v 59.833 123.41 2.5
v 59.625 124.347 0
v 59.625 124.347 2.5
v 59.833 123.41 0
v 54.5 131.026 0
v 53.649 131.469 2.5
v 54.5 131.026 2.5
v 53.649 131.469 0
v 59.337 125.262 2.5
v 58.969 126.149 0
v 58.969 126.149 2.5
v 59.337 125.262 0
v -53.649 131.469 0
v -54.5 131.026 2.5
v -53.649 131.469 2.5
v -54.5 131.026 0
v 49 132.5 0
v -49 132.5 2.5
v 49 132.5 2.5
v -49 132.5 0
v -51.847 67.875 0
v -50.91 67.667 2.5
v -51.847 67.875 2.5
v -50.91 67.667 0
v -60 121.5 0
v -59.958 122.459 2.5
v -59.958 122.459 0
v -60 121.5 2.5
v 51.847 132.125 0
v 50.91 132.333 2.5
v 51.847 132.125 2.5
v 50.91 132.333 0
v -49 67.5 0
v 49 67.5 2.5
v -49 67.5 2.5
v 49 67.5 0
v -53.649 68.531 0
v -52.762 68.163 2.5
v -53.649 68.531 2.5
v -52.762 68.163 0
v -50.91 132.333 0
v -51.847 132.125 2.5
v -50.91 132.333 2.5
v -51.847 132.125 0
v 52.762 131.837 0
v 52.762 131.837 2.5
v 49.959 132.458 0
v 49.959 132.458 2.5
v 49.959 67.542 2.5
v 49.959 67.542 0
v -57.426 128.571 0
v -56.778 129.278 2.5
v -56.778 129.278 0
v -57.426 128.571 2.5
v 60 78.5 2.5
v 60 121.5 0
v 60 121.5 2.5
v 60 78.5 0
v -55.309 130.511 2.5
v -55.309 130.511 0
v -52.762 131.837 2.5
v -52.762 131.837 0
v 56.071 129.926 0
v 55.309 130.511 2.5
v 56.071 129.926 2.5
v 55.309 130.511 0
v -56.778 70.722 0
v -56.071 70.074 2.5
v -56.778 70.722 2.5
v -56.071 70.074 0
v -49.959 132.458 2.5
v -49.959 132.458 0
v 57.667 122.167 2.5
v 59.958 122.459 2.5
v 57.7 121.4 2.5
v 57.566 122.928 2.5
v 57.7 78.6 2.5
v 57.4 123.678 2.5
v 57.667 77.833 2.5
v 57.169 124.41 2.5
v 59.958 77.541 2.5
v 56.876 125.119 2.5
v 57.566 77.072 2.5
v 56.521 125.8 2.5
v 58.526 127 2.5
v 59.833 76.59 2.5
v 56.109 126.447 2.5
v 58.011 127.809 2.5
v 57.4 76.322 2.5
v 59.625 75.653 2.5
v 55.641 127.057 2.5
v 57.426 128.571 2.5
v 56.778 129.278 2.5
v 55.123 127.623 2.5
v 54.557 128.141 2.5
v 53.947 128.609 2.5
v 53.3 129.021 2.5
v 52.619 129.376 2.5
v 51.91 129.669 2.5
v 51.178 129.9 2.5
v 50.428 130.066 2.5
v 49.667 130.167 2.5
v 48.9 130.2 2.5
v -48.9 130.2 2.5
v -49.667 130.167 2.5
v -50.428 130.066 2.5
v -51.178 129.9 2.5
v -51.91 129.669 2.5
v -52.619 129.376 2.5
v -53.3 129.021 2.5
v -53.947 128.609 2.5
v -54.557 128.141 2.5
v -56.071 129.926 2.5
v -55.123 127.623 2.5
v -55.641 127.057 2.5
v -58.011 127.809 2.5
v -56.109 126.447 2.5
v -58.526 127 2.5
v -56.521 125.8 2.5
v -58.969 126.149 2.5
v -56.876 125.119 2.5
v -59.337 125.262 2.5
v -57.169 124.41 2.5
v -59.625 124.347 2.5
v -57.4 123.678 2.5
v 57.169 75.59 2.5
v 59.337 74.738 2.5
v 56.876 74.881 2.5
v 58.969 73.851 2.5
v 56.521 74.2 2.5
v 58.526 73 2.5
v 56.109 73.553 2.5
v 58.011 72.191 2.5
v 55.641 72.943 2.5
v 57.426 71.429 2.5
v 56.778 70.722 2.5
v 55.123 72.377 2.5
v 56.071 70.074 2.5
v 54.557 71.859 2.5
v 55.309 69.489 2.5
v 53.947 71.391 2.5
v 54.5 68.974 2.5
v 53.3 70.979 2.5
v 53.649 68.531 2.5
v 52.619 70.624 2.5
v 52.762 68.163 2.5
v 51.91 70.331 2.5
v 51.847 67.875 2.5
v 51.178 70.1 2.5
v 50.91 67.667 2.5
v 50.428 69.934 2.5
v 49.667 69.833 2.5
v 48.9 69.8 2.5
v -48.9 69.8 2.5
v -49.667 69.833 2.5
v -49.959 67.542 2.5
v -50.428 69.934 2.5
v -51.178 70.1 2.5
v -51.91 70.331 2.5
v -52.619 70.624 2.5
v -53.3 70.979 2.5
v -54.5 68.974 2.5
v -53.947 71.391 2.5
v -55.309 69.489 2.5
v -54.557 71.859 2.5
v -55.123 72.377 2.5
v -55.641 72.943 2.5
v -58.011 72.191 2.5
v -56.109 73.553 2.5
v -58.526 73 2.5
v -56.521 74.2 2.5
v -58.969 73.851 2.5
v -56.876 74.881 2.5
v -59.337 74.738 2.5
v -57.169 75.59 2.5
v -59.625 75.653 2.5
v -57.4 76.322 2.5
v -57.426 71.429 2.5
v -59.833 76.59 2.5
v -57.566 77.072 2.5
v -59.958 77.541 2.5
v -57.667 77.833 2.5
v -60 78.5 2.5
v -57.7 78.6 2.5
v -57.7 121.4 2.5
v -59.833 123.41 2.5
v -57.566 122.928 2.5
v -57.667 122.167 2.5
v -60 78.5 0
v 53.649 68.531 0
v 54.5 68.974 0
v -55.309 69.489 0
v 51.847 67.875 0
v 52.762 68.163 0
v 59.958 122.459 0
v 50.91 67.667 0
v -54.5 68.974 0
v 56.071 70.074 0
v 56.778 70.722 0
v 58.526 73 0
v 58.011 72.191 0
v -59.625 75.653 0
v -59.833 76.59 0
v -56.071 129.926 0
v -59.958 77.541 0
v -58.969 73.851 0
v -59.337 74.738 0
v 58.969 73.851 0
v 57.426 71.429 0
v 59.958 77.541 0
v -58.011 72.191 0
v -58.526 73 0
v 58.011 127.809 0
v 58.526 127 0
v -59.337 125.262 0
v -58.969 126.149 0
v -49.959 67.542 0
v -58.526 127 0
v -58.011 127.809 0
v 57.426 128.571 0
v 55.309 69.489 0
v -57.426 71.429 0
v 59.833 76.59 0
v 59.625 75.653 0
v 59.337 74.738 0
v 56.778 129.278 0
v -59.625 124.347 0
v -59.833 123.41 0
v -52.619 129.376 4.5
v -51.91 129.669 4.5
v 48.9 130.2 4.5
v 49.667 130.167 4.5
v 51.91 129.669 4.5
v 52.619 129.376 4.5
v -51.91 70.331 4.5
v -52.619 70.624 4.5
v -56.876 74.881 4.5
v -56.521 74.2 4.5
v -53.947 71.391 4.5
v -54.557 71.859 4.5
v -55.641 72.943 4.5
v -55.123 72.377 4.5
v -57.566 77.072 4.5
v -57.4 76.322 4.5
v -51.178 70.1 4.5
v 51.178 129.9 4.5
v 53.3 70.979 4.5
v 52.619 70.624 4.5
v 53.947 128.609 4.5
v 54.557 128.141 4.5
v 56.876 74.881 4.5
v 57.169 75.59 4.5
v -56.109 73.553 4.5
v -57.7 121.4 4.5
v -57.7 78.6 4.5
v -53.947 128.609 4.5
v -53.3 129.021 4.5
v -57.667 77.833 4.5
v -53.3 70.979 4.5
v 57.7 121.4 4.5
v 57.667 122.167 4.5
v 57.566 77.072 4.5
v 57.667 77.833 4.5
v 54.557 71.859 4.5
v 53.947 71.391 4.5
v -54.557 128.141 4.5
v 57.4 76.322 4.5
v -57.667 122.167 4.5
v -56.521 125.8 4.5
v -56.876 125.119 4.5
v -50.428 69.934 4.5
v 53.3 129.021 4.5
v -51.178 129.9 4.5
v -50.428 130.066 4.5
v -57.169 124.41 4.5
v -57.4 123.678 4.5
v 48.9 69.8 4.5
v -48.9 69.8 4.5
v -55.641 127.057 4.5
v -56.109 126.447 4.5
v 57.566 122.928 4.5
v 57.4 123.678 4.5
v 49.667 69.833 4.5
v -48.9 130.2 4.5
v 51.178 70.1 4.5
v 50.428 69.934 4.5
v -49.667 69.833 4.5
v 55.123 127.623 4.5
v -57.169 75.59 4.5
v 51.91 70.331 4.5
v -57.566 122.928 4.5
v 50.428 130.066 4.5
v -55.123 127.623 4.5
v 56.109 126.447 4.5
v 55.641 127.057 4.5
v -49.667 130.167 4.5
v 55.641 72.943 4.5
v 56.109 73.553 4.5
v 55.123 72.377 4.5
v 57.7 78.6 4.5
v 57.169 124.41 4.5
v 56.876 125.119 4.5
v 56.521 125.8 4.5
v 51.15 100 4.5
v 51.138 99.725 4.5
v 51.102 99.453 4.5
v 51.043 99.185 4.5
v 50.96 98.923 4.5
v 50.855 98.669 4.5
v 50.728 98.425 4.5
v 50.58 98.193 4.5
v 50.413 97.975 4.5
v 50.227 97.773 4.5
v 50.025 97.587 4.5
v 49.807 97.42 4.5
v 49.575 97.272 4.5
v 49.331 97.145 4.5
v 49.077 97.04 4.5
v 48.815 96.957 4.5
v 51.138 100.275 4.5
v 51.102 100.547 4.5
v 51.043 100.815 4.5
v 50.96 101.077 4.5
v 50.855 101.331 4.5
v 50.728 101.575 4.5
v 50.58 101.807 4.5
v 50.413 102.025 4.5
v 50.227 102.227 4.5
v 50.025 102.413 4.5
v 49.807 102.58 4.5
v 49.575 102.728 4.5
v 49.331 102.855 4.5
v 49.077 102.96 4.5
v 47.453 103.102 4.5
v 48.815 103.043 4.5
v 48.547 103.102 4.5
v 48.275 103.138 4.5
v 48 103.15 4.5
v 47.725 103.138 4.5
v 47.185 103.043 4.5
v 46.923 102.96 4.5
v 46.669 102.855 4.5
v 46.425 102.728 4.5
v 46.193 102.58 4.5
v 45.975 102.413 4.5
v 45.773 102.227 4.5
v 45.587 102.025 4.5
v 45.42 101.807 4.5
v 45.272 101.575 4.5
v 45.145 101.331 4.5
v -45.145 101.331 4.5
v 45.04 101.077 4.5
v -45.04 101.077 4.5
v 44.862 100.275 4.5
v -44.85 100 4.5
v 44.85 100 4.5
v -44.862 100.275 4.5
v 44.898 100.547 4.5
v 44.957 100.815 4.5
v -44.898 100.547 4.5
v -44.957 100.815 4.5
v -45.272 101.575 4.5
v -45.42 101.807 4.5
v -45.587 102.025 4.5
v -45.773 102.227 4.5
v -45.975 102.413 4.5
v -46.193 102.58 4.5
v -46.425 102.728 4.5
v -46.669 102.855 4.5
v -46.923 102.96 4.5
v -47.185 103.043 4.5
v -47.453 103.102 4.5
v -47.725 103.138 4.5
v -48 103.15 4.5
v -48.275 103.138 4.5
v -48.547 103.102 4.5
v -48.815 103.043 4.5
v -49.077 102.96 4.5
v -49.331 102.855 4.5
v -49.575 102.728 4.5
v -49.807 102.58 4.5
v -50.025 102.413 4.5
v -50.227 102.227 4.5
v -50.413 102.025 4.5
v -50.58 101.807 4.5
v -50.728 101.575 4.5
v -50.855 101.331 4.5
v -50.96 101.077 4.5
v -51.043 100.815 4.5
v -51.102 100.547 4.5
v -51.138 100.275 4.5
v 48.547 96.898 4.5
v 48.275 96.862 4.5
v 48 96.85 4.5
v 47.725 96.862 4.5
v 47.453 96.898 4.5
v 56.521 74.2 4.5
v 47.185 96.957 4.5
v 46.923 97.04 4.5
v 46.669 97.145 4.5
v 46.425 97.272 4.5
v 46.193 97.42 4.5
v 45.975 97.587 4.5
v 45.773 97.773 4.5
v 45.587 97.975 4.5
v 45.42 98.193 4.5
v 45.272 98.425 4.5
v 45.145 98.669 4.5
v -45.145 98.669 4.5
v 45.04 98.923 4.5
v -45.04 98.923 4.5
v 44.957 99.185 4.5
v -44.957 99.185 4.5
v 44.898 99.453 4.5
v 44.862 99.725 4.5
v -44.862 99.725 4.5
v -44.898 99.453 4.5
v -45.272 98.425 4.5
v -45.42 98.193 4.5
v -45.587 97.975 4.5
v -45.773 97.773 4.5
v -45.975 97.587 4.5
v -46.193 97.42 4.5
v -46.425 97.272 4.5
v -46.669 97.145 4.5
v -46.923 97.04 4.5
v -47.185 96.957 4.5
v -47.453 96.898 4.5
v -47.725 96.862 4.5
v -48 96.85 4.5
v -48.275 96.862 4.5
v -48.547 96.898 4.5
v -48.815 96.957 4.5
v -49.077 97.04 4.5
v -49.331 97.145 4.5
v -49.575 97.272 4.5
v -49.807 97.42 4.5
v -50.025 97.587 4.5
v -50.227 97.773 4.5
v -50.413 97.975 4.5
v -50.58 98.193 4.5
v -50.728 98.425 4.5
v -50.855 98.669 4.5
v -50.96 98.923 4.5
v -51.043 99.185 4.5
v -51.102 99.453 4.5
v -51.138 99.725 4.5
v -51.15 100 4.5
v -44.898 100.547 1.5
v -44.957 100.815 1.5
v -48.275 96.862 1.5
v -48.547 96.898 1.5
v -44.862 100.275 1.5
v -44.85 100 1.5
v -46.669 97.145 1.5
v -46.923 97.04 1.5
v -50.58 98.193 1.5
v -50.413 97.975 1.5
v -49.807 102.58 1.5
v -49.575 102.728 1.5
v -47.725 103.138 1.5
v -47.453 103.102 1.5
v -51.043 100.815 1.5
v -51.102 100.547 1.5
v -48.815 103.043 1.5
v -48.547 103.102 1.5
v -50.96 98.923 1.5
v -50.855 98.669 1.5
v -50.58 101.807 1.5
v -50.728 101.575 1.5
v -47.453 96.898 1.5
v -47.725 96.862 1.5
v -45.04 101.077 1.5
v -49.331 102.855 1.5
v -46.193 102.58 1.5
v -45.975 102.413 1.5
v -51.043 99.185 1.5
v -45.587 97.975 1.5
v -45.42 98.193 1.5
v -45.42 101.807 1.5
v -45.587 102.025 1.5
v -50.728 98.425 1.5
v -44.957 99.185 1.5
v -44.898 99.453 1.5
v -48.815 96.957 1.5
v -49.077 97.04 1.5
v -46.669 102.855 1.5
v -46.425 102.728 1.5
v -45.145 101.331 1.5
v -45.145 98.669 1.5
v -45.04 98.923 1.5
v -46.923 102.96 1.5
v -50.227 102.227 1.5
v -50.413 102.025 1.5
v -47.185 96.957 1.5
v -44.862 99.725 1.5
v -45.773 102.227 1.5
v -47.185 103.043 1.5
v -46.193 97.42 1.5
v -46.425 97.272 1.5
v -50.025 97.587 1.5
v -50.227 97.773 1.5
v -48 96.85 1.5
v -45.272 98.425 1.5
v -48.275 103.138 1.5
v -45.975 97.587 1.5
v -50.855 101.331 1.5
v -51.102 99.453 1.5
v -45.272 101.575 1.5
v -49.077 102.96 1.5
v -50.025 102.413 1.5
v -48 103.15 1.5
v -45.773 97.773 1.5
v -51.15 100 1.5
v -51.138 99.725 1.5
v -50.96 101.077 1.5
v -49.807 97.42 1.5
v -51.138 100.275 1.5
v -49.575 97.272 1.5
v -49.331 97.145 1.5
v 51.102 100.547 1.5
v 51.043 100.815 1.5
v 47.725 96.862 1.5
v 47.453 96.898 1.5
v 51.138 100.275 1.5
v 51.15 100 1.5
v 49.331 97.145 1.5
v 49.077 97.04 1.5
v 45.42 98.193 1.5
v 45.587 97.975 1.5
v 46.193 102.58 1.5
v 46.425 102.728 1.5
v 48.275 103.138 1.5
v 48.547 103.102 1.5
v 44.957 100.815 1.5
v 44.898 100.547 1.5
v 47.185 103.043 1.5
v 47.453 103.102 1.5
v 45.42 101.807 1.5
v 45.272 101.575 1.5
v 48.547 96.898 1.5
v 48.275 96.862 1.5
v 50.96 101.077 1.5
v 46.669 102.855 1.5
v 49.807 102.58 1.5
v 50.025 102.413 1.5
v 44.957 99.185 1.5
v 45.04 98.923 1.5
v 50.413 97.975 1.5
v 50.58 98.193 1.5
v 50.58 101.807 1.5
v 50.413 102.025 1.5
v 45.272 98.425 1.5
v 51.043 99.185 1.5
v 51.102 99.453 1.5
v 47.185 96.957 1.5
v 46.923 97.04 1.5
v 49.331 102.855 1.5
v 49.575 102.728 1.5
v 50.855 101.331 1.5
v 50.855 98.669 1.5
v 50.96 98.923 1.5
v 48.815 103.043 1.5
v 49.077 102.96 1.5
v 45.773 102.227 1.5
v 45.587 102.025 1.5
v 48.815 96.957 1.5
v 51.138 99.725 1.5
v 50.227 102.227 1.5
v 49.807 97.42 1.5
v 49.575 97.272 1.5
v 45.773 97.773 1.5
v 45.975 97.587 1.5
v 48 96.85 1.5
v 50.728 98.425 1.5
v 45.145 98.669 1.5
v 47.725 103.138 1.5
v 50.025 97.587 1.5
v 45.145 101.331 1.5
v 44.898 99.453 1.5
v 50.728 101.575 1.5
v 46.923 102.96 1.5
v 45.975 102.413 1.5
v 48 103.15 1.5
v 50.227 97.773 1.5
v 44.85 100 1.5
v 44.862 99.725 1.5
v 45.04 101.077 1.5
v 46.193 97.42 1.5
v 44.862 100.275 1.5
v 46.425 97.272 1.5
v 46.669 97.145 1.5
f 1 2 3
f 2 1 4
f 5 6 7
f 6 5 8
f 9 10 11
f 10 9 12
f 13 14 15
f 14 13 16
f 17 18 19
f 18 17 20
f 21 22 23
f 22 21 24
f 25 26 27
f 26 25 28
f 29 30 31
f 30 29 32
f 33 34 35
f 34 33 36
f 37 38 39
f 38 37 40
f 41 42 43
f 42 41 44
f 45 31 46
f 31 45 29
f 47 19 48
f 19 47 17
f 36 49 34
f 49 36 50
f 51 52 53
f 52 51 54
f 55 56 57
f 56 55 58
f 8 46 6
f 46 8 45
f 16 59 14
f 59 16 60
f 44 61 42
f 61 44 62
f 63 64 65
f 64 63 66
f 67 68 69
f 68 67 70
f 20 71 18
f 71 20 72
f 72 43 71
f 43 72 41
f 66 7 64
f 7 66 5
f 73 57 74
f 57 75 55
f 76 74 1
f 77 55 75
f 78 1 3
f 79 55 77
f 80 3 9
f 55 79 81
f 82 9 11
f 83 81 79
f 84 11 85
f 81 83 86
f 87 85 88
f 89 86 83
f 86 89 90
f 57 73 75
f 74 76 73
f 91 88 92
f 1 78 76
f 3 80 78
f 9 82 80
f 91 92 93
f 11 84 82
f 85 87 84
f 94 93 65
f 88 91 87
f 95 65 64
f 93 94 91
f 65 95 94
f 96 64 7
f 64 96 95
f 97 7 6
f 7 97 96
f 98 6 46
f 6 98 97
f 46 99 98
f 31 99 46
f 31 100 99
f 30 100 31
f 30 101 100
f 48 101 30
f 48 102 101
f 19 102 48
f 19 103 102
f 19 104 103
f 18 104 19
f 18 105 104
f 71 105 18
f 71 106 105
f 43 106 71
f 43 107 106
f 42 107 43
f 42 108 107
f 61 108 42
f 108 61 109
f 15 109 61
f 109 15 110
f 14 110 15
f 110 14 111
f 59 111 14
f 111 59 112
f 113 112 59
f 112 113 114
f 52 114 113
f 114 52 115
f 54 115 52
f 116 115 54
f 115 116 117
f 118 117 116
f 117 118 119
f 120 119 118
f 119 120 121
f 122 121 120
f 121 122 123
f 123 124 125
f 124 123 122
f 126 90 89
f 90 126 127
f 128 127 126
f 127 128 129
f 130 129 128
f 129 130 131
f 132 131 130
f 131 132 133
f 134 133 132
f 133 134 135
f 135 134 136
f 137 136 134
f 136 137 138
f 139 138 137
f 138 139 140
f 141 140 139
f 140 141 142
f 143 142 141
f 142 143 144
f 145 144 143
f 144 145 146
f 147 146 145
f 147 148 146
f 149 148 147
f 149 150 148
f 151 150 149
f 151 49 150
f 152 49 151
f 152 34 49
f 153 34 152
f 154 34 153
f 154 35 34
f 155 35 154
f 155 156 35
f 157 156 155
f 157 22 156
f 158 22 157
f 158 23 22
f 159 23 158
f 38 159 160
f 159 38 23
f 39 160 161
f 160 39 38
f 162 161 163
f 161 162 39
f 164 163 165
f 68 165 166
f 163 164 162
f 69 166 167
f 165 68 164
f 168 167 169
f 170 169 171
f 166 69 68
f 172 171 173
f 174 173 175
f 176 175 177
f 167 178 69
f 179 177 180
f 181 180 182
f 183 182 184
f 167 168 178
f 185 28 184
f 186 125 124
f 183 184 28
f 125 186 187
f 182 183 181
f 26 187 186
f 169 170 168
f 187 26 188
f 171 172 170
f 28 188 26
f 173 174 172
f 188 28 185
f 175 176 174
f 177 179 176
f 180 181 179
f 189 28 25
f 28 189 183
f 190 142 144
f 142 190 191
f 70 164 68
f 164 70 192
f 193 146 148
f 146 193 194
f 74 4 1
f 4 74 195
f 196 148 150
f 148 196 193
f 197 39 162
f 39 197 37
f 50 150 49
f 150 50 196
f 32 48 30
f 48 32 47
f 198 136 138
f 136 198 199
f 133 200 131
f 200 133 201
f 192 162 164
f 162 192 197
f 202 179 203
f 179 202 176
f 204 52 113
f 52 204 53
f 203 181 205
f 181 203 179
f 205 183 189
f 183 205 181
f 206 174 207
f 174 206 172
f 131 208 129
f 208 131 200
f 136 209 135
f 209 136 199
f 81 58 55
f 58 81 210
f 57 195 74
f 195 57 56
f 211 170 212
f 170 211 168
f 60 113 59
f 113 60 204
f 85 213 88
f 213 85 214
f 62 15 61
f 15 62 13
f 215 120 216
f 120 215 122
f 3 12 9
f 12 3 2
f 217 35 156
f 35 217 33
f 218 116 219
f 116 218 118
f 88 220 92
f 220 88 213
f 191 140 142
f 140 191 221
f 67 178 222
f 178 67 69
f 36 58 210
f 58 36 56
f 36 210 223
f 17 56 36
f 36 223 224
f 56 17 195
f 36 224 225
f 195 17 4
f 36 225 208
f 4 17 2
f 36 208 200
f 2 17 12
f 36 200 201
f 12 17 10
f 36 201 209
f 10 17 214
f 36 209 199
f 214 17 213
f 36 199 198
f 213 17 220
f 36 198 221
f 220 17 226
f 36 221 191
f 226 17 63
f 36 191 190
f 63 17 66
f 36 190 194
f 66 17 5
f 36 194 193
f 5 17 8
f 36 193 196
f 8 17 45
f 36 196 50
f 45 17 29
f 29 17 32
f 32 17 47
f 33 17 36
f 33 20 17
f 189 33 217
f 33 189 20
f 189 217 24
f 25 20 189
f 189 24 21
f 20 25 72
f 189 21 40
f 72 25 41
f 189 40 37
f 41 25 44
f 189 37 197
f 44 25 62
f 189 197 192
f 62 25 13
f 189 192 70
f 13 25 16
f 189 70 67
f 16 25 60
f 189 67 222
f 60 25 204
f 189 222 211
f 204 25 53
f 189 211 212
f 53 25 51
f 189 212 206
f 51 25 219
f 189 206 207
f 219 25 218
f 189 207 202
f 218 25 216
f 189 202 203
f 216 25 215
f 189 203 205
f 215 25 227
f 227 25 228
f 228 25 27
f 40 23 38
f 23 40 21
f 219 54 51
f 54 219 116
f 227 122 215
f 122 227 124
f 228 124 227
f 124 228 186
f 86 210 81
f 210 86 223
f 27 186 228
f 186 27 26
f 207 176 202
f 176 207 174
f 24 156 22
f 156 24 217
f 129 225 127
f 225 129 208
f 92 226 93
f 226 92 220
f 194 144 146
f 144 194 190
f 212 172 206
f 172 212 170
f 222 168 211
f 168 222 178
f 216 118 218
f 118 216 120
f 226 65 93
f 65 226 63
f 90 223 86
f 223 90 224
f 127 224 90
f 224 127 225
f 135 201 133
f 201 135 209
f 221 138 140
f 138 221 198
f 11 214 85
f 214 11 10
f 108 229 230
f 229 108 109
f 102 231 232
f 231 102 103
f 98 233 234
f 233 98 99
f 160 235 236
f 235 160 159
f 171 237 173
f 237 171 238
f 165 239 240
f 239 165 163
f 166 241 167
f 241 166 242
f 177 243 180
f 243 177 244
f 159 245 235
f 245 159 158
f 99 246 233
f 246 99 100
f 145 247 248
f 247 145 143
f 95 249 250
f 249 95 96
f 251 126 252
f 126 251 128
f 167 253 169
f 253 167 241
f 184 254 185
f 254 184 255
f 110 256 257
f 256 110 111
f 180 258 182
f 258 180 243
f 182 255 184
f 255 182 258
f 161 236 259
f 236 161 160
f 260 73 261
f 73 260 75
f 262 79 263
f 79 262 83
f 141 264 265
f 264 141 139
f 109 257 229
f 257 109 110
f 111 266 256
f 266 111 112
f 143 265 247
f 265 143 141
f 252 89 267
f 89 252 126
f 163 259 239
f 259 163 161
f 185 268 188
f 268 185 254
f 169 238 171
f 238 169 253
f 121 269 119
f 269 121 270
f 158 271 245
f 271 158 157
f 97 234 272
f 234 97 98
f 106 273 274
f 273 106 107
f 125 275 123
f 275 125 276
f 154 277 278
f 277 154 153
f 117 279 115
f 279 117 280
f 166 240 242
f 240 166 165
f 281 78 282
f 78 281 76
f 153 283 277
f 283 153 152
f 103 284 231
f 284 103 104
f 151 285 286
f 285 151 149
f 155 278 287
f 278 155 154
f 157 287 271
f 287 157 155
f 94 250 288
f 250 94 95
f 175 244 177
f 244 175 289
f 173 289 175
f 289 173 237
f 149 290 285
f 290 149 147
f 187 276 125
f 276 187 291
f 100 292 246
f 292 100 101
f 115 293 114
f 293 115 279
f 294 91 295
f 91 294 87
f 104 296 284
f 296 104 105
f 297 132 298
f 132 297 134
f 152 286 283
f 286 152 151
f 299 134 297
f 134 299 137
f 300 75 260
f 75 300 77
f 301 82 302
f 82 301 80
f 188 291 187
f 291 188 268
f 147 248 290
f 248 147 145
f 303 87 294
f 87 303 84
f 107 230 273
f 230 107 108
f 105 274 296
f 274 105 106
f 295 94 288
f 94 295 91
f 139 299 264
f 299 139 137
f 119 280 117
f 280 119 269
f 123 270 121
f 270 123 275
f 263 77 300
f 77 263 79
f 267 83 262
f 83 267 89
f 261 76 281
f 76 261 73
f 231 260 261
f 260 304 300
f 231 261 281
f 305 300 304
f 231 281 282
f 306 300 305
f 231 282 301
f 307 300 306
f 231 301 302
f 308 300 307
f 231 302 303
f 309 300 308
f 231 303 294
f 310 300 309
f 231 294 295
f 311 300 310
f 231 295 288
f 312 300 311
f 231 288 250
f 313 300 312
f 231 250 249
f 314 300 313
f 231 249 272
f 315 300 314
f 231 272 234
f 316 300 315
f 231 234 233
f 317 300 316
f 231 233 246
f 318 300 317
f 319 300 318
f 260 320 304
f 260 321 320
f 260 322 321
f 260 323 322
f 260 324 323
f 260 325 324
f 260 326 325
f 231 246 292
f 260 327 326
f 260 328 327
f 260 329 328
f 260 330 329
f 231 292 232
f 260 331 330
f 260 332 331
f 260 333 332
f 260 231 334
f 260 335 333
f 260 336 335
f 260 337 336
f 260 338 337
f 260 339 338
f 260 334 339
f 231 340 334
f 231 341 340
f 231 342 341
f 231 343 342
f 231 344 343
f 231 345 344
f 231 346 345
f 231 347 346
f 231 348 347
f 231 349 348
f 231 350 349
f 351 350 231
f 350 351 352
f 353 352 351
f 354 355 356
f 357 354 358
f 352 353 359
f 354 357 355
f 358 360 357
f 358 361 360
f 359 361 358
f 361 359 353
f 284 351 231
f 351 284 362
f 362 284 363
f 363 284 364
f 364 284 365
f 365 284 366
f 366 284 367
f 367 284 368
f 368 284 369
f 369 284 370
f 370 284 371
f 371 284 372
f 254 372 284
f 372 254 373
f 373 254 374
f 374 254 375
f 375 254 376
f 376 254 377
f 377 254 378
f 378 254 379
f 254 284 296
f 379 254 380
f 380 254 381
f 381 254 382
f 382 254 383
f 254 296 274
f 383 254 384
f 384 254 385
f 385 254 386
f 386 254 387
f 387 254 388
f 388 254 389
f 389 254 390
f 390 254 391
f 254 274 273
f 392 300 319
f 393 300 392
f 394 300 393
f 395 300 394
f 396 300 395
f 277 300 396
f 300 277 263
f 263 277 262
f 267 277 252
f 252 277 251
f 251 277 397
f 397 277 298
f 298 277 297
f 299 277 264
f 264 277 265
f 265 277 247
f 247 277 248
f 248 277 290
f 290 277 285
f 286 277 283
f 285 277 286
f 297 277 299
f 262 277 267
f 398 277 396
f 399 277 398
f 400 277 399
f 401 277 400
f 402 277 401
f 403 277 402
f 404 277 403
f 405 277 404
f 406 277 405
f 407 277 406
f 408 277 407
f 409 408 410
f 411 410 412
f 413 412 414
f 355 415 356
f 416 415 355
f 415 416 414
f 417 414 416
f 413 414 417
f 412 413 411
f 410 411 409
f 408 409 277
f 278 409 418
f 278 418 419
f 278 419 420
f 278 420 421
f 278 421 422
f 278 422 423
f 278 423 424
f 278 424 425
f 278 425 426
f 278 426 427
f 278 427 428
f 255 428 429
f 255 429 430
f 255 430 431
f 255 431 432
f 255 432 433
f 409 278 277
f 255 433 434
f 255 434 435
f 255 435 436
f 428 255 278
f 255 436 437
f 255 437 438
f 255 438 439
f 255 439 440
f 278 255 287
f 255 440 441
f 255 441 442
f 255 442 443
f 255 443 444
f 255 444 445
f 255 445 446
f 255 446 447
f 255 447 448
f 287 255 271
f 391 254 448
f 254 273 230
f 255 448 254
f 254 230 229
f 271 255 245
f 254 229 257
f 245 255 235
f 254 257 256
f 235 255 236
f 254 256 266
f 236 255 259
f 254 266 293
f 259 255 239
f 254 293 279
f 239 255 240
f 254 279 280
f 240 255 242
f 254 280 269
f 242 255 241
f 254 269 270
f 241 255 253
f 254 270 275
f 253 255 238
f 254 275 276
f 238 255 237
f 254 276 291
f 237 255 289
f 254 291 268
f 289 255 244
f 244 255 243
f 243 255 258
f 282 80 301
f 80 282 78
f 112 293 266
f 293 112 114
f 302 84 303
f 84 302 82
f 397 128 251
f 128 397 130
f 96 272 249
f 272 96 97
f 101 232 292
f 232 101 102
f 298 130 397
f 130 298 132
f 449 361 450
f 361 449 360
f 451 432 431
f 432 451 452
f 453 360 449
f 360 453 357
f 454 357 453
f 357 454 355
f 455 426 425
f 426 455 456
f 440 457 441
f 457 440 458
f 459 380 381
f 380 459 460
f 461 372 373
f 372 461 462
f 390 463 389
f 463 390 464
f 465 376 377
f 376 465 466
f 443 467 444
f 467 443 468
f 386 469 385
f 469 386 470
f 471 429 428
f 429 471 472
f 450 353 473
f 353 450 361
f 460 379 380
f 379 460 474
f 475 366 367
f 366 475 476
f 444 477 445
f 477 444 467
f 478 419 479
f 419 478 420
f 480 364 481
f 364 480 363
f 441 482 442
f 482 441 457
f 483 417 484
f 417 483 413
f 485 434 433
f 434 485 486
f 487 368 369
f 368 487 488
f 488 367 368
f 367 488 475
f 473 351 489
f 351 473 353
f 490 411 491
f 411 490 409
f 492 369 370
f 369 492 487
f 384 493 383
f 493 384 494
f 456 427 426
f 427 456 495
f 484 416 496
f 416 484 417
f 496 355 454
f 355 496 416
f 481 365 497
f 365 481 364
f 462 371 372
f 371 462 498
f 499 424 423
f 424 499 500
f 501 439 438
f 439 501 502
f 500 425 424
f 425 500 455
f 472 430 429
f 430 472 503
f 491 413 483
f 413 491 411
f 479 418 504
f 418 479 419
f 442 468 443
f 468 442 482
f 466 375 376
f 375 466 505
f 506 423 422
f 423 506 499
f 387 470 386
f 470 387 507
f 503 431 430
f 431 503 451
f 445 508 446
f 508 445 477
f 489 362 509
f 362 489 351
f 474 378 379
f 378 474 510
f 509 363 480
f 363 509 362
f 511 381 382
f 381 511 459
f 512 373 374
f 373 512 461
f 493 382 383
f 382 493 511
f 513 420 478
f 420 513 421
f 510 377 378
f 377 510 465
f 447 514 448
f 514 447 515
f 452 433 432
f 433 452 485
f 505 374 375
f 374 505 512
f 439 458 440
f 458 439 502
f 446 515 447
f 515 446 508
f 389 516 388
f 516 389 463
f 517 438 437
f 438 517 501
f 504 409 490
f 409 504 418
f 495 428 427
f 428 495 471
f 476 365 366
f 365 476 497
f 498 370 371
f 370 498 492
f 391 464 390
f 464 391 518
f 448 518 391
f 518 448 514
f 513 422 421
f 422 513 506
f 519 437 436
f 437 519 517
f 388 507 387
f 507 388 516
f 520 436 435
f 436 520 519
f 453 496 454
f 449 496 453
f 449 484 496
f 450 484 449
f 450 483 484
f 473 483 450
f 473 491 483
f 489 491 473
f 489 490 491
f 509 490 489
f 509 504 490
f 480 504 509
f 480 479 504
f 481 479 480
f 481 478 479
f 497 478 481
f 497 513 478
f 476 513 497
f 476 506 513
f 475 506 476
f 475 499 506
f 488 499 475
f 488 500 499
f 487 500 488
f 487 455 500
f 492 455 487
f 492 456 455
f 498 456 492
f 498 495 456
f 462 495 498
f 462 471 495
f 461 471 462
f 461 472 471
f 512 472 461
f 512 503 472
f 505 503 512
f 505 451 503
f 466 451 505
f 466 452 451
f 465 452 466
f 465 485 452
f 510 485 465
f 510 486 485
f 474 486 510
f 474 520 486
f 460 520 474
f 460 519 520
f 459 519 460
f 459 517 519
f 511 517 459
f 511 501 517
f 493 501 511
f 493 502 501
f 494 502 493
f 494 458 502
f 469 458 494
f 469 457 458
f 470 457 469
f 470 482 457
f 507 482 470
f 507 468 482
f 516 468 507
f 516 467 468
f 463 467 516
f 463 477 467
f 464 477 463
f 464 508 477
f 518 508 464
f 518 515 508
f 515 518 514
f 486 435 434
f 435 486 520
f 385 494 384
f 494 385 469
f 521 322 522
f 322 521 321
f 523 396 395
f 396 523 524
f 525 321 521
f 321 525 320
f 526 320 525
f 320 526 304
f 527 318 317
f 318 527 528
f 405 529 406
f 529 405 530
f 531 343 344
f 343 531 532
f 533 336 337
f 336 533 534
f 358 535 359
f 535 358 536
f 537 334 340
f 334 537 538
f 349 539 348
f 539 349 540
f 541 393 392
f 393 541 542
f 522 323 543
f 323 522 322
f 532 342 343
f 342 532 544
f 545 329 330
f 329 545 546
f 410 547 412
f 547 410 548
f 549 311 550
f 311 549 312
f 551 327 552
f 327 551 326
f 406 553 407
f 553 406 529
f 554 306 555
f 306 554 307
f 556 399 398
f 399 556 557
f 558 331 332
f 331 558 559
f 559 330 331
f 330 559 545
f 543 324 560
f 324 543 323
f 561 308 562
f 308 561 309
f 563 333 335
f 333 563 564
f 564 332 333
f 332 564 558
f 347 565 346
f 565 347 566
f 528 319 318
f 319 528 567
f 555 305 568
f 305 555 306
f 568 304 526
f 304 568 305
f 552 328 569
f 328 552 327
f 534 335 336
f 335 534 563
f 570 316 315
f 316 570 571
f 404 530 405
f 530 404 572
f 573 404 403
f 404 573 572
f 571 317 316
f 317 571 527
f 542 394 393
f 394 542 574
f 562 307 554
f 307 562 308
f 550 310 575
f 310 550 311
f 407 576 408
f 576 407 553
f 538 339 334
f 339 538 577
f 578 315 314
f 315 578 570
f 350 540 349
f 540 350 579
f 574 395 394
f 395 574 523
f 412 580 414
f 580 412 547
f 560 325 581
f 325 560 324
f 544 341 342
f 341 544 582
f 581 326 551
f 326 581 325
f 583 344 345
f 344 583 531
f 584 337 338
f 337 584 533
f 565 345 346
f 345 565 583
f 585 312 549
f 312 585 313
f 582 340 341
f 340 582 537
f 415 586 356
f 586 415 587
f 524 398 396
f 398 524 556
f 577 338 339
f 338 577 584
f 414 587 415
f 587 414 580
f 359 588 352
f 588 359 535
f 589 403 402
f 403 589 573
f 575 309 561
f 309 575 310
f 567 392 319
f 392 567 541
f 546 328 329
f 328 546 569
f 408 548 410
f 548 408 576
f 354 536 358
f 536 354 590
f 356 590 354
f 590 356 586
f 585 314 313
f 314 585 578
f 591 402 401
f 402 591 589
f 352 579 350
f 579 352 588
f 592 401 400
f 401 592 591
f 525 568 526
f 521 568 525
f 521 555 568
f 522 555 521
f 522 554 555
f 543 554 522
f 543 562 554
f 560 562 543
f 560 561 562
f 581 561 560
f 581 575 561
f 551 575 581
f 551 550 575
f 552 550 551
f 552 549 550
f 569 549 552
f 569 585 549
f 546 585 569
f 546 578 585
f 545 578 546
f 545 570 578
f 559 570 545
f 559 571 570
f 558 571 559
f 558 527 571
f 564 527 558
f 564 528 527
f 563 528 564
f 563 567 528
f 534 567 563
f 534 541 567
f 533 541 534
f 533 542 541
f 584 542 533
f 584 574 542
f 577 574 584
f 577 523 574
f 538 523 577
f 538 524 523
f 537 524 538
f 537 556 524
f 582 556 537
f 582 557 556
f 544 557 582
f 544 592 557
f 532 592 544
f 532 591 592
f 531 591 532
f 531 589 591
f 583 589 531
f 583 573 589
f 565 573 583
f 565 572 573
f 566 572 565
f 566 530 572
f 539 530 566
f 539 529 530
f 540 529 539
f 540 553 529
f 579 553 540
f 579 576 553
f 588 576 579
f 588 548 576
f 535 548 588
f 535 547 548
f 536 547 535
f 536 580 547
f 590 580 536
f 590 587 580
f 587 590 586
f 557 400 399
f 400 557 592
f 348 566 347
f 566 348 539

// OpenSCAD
// GPS_BUDDY CASE 

$fn = 72;

// External case dimensions 
case_w = 120;
case_d = 65;
case_h = 39; //depth of case
corner_rad = 11;

// PCB standoffs (ElectroCookie)  
pcb_width  = 78.5; 
pcb_depth  = 36.0;
pcb_shift_x = -10;  // Horizontal shift
standoff_d  = 4.5;    // Narrowed for M2 compatibility
screw_hole_d = 1.8;   // fit for M2 screw threads
standoff_h  = 4.0;    // Height of the post


//Internal dims
wall = 2.2;
seam_z = 16.0;          // Height of the front shell

//  OLED 
oled_w = 36;
oled_h = 20;
oled_x = -10;    // Centered horizontally 
oled_y = 4;

//  BUTTONS 
btn_diam = 7;
btn_spacing = 25;
btn_z = 6.0;          // Define height from the floor
btn_w = 6;          // Width of the rectangle
btn_h = 10;         // Height of the rectangle

// USB
usb_w = 8;
usb_h = 3.5;
usb_z = 8.5;

//  MAGNETS FOR BACKPLATE
magnet_d = 6.2;
magnet_h = 3;
magnet_offset = 12;

// BUTTON KEYCAP
btn_clearance = 0.4;    // Gap between button and hole (0.2-0.4 is  good)
btn_extrude = 3.0;      // How far button sticks out of the case
btn_flange_w = 2.0;     // How much wider the base is (prevents falling through)
btn_flange_t = 1.5;     // Thickness of base plate

//Back lid Parameters for Bambu A1 Mini 
tolerance = 0.2; // 0.2mm is standard for a snug fit on Bambu Lab
lid_plate_h = 2.5; 
lip_h = 2.0;




// BASIC SHAPES

module rounded_box(w,d,h,r) {
    hull() {
        for(x=[-1,1], y=[-1,1])
            translate([x*(w/2-r), y*(d/2-r), 0])
                cylinder(r=r, h=h);
    }
}

module pill(w,h,d) {
    hull() {
        translate([-(w-h)/2,0,0]) cylinder(d=h,h=d,center=true);
        translate([(w-h)/2,0,0])  cylinder(d=h,h=d,center=true);
    }
}

// FRONT SHELL

module front_shell() {
    difference() {
        // POSITIVE BODY
        rounded_box(case_w, case_d, case_h, corner_rad);

        // BACK CUT OUT
        translate([0,0,seam_z + case_h/2])
            cube([case_w+40, case_d+40, case_h], center=true);

        // TRUE HOLLOW CAVITY
        
        translate([0,0,wall])
            rounded_box(case_w - 2*wall, case_d - 2*wall, case_h, corner_rad - wall);

        // OLED CUTOUT
        // Cuts through floor (Z=0) to inside
        translate([oled_x, oled_y, -1])
            rounded_box(oled_w, oled_h, wall*3, 2);

        // USB CUTOUT
        translate([-case_w/2, 0, wall+usb_z])
            rotate([0,90,0])
            rotate([0,0,90])
            pill(usb_w, usb_h, 20);

        // BUTTON HOLES
        for(i=[-1,1])
           // translate([i*btn_spacing/2, -case_d/2, wall+btn_z]) // adds buttons to top side
              //  rotate([0,90,0])
              //  rotate([90,0,0])
              //  cube([btn_w, btn_h, 20], center=true);
            translate([oled_x + (i * btn_spacing/2), oled_y - 20, -1])
                rotate([0,0,90])
                rounded_box(btn_w, btn_h, wall*3, 2);
          
                
        // MAGNET POCKETS
        for(x=[-1,1])
            translate([x*(case_w/2-magnet_offset), 0, seam_z-magnet_h])
                cylinder(d=magnet_d, h=magnet_h+1);
    }

    //  PCB STANDOFFS
    intersection() {
    // Limits standoffs to the inside of the shell
    translate([0,0,0]) rounded_box(case_w, case_d, seam_z, corner_rad);
    
    union() {
        for(mx = [-1, 1], my = [-1, 1]) {
            // Apply the shift and the half-distances
            translate([(mx * pcb_width/2) + pcb_shift_x, my * pcb_depth/2, wall]) {
                difference() {
                    // Outer Post
                    cylinder(d=standoff_d, h=standoff_h); 
                    
                    // M2 Screw Hole
                    translate([0, 0, -0.1])
                        cylinder(d=screw_hole_d, h=standoff_h + 0.2);
                }
            }
        }
    }
}
}


// BACK LID
module back_lid() {
    difference() {
        // THE BODY
        union() {
            // Exterior visible plate
            rounded_box(case_w, case_d, lid_plate_h, corner_rad);
            
            // The insert lip (shrunk by tolerance on all sides)
            translate([0, 0, lid_plate_h])
                rounded_box(case_w - 2*wall - tolerance, 
                            case_d - 2*wall - tolerance, 
                            lip_h, 
                            corner_rad - wall);
        }

        // MAGNET POCKETS 
        for(x=[-1,1])
            translate([x*(case_w/2 - magnet_offset), 0, lid_plate_h + lip_h - magnet_h])
                // +0.1 on diameter for easier magnet insertion
                cylinder(d=magnet_d + 0.1, h=magnet_h + 0.1); 
    }
}

// Button insert
module push_button() {
    b_w = btn_w - btn_clearance;
    b_h = btn_h - btn_clearance;
    b_r = 2 - (btn_clearance/2); // Adjust radius for clearance

    // THE FLANGE (Inside the case)
    color("Silver")
    translate([0, 0, 0])
        rounded_box(btn_w + btn_flange_w, btn_h + btn_flange_w, btn_flange_t, 2);

    // KEYCAP
    color("DimGray")
    translate([0, 0, btn_flange_t])
    hull() {
        // Bottom of cap (at the flange)
        rounded_box(b_w, b_h, 0.1, b_r);
        
        // Top of cap (at the surface)
        translate([0, 0, wall + btn_extrude])
            rounded_box(b_w, b_h, 0.1, b_r);
    }
}

// RENDER: comment out shell or back_lid 
//front_shell();
translate([0, 100, 0]) back_lid();
// Render the buttons next to the case
//translate([0, -60, 0]) push_button();
//translate([0, -80, 0]) push_button();
// uncomment bottom to check alignment 
//% translate([-15, 0, wall+4]) square([78.5, 36.0], center=true);
